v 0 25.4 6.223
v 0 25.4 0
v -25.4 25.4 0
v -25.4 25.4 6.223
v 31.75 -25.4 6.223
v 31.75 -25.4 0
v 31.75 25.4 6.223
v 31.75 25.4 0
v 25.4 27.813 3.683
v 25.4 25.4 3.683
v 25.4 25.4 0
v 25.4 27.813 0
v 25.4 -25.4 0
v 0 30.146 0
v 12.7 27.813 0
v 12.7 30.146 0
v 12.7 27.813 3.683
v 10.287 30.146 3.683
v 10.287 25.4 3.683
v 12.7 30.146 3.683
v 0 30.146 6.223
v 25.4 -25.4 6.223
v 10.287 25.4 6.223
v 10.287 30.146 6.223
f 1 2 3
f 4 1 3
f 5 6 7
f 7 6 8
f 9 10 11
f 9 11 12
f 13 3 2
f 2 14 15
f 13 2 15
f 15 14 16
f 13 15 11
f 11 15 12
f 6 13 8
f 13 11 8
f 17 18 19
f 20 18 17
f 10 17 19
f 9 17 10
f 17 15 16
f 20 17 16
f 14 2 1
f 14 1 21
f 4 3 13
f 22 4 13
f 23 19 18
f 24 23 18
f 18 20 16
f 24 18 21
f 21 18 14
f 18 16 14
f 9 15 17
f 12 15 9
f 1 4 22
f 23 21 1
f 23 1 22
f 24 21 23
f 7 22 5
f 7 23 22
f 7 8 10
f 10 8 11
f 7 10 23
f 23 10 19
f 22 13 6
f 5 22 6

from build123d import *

# Parameters (mm, degrees)
F0_W     = 10.287
F0_H     = 4.745708
F0_W_2   = 6.35
F0_H_2   = 50.8
F1_DEPTH = 6.223
F0_W_3   = 12.7
F0_H_3   = 2.413
F2_DEPTH = 3.683


with BuildPart() as f1:
    # F0 (on Top) → F1 (new body)
    with BuildSketch(Plane.XY):
        Polygon((-25.4, 25.4), (25.4, -25.4), (25.4, 25.4), (12.7, 25.4), (10.287, 25.4), (0, 25.4), align=None)
        with Locations((5.1435, 27.772854)):
            Rectangle(F0_W, F0_H)
        with Locations((28.575, 0)):
            Rectangle(F0_W_2, F0_H_2)
    extrude(amount=F1_DEPTH)

    # F0 (on Top) → F2 (join)
    with BuildSketch(Plane.XY):
        Polygon((10.287, 25.4), (12.7, 25.4), (12.7, 27.813), (12.7, 30.145708), (10.287, 30.145708), align=None)
        with Locations((19.05, 26.6065)):
            Rectangle(F0_W_3, F0_H_3)
    extrude(amount=F2_DEPTH)


solid = f1.part
